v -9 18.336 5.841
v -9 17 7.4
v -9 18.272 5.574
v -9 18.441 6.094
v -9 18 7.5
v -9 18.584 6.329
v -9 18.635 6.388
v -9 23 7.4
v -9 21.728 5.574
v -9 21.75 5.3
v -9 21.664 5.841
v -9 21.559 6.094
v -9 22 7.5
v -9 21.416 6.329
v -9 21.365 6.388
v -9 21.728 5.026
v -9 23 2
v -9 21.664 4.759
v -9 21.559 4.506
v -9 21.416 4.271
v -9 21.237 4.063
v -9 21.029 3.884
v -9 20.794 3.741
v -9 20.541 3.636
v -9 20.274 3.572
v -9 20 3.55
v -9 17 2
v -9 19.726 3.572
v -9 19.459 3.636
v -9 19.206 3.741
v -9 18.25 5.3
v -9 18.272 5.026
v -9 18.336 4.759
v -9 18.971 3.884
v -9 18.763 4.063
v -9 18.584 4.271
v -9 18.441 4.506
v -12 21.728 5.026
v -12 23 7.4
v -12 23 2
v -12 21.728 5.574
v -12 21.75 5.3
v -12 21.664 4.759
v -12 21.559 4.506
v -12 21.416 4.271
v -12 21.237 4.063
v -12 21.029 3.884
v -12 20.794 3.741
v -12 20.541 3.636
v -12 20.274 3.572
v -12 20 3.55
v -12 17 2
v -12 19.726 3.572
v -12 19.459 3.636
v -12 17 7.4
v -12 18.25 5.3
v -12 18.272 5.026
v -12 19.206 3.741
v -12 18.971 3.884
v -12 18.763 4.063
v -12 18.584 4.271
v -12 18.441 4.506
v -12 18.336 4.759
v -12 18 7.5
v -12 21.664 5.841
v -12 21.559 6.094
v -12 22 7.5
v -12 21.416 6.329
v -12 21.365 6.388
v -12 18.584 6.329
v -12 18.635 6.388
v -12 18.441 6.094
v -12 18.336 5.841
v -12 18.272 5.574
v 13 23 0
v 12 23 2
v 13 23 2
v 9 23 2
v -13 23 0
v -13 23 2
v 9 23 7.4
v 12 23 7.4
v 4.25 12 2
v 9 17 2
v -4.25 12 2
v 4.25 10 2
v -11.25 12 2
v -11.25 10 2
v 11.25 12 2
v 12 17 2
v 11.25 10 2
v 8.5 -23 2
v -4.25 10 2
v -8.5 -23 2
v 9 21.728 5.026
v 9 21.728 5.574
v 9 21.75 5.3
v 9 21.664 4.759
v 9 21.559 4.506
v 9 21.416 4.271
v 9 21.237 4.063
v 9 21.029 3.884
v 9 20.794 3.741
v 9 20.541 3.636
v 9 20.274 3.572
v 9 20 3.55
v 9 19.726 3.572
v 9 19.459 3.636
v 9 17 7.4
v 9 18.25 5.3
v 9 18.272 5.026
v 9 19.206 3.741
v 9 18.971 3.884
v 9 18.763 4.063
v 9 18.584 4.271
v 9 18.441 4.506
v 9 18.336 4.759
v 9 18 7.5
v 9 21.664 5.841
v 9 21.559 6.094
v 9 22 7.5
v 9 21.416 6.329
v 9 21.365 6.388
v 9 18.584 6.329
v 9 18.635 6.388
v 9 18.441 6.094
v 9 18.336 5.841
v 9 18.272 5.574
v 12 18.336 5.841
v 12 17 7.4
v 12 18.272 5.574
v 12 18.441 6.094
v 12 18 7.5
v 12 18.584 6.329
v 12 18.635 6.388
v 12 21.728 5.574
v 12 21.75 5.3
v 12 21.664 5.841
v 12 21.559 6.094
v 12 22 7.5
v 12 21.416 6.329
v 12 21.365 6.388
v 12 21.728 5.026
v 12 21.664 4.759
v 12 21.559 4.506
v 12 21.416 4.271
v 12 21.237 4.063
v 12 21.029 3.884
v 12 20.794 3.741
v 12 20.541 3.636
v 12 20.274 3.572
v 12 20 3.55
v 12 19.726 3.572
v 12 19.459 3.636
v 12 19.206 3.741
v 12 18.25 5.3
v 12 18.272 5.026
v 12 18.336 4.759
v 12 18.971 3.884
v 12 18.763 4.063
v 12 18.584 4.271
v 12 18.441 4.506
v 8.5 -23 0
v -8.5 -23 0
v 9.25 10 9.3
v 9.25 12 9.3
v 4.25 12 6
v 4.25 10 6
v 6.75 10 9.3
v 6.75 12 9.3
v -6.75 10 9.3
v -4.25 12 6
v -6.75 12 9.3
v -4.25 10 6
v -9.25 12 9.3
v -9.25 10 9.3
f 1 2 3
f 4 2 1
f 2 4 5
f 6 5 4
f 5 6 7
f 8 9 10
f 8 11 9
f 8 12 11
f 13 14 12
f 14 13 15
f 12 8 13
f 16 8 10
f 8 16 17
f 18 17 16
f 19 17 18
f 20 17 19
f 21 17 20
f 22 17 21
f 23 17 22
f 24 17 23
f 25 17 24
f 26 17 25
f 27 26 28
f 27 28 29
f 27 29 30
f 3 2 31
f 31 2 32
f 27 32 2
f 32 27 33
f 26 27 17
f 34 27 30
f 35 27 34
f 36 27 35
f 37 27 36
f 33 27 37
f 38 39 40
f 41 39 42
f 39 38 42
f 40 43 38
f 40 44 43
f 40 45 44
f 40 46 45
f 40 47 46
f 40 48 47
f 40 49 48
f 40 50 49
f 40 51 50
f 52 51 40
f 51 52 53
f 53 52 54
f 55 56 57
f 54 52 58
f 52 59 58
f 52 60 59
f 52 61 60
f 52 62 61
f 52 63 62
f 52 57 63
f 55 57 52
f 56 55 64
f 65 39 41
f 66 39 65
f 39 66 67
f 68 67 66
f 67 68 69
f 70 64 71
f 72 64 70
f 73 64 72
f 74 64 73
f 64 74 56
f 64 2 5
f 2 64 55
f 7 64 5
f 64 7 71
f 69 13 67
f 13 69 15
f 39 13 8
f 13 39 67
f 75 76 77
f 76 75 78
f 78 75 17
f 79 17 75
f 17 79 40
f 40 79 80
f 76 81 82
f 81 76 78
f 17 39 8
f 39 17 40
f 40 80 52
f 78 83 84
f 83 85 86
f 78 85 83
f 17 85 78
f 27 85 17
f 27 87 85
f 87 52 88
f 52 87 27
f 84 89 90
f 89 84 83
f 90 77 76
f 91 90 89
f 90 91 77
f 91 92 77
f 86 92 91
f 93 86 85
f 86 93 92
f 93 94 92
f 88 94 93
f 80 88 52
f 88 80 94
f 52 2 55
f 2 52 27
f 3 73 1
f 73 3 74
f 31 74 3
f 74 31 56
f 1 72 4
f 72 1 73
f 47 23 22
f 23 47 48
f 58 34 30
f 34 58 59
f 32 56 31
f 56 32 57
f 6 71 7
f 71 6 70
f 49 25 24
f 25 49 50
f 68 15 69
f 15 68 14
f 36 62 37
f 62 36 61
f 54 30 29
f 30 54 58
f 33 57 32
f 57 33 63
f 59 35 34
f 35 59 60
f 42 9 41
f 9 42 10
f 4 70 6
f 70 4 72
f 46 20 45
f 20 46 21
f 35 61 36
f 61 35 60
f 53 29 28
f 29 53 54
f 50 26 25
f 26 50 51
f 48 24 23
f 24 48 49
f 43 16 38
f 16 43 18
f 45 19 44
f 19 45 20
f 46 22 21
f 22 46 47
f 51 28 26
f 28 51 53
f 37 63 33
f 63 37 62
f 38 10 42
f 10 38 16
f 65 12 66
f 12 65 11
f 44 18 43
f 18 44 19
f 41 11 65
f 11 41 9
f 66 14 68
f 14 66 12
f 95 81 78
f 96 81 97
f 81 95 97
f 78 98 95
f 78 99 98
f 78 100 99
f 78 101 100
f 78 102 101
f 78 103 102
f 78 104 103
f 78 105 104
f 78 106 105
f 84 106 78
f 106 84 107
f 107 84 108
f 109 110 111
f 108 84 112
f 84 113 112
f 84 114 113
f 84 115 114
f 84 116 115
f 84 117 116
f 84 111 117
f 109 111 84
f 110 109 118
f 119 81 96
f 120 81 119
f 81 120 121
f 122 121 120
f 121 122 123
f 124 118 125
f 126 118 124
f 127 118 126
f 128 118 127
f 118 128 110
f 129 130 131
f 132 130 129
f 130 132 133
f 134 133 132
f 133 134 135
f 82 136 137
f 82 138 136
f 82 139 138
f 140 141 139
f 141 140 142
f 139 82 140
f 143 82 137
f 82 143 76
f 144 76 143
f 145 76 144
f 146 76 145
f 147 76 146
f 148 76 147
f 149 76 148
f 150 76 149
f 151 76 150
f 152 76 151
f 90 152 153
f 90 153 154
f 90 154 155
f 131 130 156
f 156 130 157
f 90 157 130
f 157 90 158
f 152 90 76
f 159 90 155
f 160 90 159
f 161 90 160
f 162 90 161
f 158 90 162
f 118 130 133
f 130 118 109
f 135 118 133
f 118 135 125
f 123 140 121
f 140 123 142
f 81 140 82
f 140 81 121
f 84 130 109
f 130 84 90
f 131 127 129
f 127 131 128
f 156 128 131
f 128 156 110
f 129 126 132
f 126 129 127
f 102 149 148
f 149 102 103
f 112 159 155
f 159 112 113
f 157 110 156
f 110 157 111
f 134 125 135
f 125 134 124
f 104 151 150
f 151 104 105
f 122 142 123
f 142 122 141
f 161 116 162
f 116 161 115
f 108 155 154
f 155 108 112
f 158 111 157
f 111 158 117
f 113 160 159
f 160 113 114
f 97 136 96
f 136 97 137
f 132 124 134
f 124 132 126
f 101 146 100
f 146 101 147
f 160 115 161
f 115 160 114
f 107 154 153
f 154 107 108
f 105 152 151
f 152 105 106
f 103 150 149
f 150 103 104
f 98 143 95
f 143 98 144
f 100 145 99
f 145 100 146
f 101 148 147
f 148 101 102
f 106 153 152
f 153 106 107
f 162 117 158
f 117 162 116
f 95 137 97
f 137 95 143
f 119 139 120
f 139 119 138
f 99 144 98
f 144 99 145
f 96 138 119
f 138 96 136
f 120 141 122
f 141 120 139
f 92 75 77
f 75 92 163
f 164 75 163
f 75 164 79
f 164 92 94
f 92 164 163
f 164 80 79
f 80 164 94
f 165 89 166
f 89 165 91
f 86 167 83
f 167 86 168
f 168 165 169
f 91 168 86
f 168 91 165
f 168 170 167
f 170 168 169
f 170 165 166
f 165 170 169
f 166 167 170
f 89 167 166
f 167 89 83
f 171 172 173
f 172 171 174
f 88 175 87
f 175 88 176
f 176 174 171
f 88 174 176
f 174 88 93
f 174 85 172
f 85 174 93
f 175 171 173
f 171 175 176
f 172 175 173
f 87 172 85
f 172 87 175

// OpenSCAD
// Spare part for cookie maker from the 50s
// Print in PLA
// rotate([0,0,0])
$fn=40;

// 2 extrusions of the polygonish shapes
module polygonish() {
translate([0,35,2]) {
    rotate([90, 0, 0])
    translate([8.5/2, 0])
    linear_extrude(height=2)
    polygon(points = [[0, 0], [7, 0], [5, 7.3], [2.5, 7.3], [0, 4]]);
}
}

module grip() {
    rotate([0, -90, 0])
    translate([0, 0, 18/2])
    rotate([0, 0, -90])
    difference() {
    linear_extrude(height=3)
    polygon(points = [[0, 0], [6, 0], [6, 5.4], [5, 5.5], [3, 2], [1, 5.5],[0, 5.4]]);
    translate([3, 3.3, -0.5])
    cylinder(4, r=3.5/2);
    }
}

translate([0, -23, 0]) {

linear_extrude(height=2)
translate([0,0,2])
polygon(points = [[17/2, 0], [-17/2, 0], [-26/2, 46], [26/2, 46]]);


polygonish();
mirror() polygonish();


translate([0, 46, 2]) {
grip();
mirror() grip();
}
}
